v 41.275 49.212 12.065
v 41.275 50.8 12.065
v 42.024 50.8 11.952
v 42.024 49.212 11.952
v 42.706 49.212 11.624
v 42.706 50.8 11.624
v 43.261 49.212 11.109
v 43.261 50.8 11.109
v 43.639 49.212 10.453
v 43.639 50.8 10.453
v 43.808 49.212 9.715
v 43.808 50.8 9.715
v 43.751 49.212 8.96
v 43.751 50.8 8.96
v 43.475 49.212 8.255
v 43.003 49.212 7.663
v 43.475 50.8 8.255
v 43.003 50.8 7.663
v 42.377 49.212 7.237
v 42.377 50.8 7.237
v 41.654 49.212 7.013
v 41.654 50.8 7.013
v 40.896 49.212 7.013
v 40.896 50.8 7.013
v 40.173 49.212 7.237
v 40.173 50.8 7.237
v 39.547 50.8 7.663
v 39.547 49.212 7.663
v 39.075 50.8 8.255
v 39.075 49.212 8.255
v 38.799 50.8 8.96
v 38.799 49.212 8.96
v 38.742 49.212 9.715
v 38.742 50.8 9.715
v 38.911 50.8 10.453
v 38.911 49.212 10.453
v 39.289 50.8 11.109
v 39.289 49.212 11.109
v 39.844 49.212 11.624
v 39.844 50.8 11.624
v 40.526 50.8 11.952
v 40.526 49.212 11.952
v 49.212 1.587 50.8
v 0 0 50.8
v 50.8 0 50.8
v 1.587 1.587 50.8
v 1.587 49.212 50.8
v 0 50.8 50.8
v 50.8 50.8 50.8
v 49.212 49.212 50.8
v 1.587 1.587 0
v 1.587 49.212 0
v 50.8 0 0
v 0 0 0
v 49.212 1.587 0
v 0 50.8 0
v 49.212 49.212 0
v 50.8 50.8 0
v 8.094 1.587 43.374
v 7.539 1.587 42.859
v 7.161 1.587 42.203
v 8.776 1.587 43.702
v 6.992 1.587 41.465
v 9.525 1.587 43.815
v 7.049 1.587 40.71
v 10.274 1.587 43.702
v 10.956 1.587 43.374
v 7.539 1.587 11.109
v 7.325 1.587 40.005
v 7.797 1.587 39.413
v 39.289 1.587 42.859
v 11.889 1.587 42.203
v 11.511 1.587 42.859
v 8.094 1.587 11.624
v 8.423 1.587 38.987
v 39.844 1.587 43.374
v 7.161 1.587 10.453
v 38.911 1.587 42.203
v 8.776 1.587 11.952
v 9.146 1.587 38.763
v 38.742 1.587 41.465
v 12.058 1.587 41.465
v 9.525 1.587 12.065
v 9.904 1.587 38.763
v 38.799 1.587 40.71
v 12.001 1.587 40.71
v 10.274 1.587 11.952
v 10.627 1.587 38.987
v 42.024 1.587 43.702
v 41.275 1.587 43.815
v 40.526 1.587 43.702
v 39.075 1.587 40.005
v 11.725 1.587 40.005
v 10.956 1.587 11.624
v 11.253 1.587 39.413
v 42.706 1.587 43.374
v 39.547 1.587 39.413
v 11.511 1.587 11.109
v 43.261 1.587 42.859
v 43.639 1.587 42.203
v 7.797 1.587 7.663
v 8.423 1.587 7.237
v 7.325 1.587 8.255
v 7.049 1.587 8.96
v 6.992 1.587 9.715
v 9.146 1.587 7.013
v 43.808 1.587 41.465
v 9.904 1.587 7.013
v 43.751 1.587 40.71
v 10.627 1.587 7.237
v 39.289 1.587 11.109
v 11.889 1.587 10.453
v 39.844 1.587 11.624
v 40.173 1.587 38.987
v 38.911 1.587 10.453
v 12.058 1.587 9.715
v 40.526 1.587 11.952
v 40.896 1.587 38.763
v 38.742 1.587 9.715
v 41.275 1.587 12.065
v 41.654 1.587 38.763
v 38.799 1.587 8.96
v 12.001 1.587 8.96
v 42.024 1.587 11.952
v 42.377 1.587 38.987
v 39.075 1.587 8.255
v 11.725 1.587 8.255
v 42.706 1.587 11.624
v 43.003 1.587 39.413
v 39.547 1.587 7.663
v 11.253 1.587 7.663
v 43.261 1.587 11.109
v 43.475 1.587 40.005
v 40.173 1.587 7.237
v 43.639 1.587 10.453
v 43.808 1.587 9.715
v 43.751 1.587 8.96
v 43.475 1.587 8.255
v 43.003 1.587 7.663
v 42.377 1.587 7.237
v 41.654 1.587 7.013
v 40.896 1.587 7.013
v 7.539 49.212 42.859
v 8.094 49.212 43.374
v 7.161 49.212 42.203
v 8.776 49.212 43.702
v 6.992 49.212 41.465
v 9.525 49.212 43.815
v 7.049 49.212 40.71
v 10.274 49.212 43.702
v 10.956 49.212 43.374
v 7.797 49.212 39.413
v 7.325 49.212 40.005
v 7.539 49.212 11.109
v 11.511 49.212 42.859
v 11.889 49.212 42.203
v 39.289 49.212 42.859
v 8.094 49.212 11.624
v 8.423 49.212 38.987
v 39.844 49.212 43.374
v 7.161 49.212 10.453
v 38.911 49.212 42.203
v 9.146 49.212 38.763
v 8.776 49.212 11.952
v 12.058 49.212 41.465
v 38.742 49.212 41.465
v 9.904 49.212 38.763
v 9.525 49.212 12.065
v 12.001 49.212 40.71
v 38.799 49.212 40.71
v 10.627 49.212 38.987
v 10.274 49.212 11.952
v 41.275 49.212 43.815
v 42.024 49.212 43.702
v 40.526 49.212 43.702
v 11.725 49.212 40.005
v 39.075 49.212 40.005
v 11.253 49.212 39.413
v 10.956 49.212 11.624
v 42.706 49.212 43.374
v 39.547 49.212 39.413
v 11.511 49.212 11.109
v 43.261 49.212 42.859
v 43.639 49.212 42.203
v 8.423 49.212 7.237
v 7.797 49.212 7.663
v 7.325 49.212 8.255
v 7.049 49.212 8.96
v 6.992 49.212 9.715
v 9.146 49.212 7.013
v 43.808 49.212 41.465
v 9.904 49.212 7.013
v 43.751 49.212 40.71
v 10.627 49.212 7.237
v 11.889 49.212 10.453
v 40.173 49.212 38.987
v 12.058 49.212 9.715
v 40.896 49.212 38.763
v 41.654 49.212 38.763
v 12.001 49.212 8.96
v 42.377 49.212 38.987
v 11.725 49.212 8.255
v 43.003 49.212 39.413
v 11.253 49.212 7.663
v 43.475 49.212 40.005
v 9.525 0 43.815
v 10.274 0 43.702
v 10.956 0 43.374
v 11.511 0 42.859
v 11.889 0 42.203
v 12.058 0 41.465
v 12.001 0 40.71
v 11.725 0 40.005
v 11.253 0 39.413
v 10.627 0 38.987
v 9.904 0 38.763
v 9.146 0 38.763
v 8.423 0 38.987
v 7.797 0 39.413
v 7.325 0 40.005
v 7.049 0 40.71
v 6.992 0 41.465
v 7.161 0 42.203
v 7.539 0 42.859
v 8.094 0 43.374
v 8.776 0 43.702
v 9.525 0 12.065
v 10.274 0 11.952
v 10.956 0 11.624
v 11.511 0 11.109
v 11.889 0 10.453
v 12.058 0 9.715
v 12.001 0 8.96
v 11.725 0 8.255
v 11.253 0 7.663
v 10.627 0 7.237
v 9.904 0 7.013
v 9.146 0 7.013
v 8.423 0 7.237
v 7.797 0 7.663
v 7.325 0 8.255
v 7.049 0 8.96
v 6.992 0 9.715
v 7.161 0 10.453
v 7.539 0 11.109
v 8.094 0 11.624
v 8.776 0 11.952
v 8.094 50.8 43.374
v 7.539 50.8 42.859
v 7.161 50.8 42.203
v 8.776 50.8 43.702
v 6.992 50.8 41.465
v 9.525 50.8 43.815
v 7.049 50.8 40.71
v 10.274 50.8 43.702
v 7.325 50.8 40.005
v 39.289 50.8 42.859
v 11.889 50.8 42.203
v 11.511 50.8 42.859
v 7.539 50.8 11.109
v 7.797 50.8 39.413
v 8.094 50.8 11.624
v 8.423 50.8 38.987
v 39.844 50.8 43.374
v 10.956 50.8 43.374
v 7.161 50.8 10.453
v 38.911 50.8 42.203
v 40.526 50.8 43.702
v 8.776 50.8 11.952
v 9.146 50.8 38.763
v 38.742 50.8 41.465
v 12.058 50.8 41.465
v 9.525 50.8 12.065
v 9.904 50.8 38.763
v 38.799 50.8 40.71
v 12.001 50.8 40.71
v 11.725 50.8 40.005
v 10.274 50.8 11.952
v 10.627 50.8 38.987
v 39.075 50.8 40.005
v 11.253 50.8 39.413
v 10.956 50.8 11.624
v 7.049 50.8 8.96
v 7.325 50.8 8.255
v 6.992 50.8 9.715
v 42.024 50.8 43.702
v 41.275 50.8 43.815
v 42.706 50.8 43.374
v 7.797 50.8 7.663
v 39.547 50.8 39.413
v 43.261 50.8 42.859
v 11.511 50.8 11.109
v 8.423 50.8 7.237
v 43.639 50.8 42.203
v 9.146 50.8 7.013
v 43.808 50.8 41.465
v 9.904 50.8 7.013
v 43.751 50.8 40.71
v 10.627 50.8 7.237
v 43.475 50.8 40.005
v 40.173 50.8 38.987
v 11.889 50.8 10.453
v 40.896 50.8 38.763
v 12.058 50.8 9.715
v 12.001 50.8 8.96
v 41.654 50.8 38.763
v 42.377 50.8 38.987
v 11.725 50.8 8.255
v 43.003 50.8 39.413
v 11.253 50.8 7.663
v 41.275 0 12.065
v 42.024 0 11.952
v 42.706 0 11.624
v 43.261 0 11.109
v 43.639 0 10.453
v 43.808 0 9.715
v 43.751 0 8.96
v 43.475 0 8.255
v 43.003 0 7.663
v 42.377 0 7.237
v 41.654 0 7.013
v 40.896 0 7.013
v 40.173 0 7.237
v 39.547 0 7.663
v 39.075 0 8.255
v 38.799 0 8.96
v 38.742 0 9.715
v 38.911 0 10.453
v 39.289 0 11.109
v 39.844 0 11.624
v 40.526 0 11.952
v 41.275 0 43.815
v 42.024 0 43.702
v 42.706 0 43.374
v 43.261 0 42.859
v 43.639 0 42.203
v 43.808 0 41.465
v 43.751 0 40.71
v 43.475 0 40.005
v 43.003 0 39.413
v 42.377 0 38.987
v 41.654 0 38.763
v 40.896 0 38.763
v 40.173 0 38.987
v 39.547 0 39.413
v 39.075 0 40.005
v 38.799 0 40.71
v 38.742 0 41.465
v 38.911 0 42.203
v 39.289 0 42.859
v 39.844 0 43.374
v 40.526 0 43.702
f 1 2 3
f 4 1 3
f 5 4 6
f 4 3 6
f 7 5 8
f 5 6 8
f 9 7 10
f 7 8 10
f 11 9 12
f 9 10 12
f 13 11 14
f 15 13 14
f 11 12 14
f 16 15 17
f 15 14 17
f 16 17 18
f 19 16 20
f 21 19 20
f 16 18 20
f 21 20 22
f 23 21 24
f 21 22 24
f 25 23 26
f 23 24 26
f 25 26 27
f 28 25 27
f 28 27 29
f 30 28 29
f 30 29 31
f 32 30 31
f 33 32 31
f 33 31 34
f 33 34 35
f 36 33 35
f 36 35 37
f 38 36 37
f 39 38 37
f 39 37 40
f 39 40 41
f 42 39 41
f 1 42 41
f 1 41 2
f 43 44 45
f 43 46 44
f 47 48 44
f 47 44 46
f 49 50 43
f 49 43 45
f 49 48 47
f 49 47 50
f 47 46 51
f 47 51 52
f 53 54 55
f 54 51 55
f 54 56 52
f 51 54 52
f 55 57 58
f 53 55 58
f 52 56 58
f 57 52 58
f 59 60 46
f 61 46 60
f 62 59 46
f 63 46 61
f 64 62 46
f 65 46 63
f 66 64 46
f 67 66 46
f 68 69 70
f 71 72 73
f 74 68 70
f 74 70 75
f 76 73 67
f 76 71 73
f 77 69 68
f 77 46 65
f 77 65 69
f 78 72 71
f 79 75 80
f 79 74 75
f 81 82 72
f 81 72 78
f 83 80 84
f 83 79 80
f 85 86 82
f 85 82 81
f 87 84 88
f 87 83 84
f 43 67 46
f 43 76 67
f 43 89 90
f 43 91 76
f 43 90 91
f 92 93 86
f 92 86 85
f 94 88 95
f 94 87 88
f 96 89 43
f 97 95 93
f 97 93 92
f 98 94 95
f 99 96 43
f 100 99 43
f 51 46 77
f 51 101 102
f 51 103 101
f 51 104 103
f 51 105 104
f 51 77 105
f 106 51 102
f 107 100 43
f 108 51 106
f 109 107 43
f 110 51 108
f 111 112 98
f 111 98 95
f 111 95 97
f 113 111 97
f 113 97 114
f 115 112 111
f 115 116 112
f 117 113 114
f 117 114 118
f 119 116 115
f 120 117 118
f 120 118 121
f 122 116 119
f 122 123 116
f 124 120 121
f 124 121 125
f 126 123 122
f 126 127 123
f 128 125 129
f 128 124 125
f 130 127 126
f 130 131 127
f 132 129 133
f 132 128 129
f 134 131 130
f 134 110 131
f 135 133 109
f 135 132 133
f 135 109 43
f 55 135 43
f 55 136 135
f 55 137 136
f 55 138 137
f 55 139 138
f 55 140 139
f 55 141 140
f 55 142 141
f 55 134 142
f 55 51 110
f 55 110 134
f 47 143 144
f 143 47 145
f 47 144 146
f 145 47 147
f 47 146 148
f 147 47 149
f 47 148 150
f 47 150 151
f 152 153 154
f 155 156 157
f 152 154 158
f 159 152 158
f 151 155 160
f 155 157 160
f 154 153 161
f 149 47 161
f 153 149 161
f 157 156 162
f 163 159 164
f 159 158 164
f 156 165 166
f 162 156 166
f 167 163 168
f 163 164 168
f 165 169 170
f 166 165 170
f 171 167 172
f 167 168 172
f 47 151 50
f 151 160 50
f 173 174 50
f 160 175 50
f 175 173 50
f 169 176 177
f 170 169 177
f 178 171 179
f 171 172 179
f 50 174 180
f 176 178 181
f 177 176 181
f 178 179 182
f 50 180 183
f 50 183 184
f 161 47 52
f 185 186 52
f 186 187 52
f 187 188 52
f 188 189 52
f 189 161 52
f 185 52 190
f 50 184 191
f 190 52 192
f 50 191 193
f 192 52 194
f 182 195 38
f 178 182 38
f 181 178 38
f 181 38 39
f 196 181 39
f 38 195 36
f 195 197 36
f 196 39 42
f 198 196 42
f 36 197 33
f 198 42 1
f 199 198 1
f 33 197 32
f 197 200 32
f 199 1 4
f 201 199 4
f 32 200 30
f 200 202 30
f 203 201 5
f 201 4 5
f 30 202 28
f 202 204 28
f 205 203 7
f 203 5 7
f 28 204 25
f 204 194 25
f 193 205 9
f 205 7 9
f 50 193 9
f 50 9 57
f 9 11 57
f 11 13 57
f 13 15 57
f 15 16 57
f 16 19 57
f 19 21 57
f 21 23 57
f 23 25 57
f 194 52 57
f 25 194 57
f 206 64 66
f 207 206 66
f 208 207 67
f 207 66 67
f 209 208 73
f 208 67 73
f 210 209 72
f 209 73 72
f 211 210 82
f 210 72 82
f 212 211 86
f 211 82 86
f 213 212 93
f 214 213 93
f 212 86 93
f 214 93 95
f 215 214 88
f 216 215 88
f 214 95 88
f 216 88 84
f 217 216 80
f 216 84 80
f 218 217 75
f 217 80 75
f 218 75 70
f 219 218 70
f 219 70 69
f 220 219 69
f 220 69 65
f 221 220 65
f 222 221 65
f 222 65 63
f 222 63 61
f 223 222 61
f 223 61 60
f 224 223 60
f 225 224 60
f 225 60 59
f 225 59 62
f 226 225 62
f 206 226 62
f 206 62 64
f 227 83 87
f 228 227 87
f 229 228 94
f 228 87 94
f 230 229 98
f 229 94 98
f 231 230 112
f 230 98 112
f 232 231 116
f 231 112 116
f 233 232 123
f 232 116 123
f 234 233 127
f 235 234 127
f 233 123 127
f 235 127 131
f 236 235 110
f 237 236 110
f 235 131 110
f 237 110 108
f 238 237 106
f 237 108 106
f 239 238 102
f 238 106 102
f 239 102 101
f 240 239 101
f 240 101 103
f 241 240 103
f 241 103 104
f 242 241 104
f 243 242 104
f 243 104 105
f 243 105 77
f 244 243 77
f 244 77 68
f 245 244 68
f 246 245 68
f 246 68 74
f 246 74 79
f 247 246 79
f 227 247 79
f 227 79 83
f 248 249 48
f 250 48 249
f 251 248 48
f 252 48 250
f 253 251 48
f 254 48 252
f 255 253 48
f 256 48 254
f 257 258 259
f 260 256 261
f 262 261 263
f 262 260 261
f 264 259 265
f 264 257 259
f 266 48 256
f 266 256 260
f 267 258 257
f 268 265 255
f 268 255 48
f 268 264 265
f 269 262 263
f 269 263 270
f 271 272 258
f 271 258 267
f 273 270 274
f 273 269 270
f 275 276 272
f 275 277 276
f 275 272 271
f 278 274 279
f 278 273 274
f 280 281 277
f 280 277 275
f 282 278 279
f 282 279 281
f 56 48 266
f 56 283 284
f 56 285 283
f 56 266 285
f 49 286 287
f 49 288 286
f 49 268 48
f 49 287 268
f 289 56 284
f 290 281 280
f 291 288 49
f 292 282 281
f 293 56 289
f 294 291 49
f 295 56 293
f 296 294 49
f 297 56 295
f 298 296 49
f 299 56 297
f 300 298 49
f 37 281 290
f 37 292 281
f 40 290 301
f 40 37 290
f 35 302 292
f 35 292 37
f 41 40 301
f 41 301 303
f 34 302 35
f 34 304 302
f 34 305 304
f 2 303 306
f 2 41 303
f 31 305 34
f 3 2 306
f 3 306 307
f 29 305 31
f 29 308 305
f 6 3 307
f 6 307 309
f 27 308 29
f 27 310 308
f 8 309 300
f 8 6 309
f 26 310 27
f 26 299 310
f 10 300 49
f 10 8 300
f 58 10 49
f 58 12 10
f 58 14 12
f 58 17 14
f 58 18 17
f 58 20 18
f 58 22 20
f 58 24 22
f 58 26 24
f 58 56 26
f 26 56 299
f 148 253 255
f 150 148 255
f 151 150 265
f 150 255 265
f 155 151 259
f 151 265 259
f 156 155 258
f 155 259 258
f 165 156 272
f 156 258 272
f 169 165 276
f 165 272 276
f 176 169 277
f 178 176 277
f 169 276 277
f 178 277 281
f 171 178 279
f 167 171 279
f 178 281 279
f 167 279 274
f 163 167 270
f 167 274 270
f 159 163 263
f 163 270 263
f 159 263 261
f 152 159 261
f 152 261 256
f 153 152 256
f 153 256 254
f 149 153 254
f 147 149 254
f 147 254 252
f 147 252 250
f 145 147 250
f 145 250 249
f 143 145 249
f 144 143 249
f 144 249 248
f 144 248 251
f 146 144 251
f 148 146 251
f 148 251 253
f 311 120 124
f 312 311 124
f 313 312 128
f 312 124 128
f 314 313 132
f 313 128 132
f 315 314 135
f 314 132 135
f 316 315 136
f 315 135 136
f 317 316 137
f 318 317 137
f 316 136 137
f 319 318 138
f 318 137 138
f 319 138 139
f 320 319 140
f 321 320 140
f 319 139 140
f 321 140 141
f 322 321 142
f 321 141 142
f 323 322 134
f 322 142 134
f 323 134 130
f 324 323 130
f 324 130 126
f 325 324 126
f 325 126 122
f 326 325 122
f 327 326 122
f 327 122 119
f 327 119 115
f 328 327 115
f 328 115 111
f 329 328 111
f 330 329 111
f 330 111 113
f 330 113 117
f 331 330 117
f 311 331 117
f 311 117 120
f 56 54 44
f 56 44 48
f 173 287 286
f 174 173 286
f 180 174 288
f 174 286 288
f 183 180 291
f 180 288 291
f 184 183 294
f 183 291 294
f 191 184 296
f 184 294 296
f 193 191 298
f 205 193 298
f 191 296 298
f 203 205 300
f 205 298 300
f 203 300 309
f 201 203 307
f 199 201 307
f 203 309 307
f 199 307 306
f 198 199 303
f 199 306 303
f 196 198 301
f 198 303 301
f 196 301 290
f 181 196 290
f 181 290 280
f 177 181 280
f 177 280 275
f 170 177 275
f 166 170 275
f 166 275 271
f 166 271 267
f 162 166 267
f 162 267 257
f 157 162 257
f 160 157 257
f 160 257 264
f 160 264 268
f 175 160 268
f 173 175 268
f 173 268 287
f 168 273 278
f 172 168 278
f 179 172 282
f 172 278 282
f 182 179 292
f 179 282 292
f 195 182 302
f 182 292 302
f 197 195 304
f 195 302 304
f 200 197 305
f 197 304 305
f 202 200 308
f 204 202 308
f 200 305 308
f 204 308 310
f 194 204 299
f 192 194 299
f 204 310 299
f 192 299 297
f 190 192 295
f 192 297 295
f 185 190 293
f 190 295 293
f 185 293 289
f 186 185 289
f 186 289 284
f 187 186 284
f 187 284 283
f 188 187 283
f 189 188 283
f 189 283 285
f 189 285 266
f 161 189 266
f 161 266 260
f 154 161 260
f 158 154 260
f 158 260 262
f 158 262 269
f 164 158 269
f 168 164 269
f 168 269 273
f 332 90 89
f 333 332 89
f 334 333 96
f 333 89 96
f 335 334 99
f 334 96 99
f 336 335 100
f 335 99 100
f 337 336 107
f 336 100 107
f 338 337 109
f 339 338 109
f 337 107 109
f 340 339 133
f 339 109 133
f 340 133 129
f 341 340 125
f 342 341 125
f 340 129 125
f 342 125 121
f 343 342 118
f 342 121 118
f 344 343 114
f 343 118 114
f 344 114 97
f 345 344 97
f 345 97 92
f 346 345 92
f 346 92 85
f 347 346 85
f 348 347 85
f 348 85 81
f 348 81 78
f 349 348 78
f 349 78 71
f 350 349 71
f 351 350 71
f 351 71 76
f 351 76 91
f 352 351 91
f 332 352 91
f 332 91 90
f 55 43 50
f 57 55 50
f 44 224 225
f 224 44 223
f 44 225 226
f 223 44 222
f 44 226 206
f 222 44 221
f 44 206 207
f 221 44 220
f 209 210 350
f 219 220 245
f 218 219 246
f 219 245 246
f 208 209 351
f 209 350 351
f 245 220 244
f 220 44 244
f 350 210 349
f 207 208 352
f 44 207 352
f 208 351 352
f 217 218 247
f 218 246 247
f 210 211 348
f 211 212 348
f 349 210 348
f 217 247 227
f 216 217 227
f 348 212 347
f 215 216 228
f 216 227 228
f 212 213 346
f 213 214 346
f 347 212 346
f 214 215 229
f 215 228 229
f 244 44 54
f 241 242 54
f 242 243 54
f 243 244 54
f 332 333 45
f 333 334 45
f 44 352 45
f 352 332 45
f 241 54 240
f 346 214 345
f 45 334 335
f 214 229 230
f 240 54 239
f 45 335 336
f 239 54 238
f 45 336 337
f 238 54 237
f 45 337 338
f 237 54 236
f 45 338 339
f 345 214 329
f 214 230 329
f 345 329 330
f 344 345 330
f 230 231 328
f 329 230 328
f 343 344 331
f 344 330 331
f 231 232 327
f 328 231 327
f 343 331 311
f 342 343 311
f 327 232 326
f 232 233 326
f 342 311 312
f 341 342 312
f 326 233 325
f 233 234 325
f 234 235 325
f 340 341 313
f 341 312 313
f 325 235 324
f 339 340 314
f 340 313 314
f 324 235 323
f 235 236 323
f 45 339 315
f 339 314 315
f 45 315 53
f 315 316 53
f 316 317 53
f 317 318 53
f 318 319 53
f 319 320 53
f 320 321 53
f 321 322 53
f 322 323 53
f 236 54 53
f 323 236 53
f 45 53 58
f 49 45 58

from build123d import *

# Parameters (mm, degrees)
SKETCH2_W           = 50.8
SKETCH2_H           = 50.8
SKETCH2_W_2         = 47.625
SKETCH2_H_2         = 47.625
BOSS_EXTRUDE1_DEPTH = 50.8
SKETCH3_R           = 2.54
CUT_EXTRUDE1_DEPTH  = 88.988181024


with BuildPart() as part:
    # Sketch2 → Boss-Extrude1 (new body)
    with BuildSketch(Plane.XY):
        with Locations((25.4, 25.4)):
            Rectangle(SKETCH2_W, SKETCH2_H)
        with Locations((25.4, 25.4)):
            Rectangle(SKETCH2_W_2, SKETCH2_H_2, mode=Mode.SUBTRACT)
    extrude(amount=BOSS_EXTRUDE1_DEPTH)

    # Sketch3 → Cut-Extrude1 (cut, through all)
    with BuildSketch(Plane(origin=(0, 50.8, 0), x_dir=(1, 0, 0), z_dir=(0, 1, 0))):
        with Locations(Location((41.275, -9.525, 0), (0, 0, 270))):
            Circle(SKETCH3_R)
        with Locations(Location((41.275, -41.275, 0), (0, 0, 270))):
            Circle(SKETCH3_R)
        with Locations(Location((9.525, -9.525, 0), (0, 0, 270))):
            Circle(SKETCH3_R)
        with Locations(Location((9.525, -41.275, 0), (0, 0, 270))):
            Circle(SKETCH3_R)
    extrude(amount=-CUT_EXTRUDE1_DEPTH, mode=Mode.SUBTRACT)


solid = part.part
